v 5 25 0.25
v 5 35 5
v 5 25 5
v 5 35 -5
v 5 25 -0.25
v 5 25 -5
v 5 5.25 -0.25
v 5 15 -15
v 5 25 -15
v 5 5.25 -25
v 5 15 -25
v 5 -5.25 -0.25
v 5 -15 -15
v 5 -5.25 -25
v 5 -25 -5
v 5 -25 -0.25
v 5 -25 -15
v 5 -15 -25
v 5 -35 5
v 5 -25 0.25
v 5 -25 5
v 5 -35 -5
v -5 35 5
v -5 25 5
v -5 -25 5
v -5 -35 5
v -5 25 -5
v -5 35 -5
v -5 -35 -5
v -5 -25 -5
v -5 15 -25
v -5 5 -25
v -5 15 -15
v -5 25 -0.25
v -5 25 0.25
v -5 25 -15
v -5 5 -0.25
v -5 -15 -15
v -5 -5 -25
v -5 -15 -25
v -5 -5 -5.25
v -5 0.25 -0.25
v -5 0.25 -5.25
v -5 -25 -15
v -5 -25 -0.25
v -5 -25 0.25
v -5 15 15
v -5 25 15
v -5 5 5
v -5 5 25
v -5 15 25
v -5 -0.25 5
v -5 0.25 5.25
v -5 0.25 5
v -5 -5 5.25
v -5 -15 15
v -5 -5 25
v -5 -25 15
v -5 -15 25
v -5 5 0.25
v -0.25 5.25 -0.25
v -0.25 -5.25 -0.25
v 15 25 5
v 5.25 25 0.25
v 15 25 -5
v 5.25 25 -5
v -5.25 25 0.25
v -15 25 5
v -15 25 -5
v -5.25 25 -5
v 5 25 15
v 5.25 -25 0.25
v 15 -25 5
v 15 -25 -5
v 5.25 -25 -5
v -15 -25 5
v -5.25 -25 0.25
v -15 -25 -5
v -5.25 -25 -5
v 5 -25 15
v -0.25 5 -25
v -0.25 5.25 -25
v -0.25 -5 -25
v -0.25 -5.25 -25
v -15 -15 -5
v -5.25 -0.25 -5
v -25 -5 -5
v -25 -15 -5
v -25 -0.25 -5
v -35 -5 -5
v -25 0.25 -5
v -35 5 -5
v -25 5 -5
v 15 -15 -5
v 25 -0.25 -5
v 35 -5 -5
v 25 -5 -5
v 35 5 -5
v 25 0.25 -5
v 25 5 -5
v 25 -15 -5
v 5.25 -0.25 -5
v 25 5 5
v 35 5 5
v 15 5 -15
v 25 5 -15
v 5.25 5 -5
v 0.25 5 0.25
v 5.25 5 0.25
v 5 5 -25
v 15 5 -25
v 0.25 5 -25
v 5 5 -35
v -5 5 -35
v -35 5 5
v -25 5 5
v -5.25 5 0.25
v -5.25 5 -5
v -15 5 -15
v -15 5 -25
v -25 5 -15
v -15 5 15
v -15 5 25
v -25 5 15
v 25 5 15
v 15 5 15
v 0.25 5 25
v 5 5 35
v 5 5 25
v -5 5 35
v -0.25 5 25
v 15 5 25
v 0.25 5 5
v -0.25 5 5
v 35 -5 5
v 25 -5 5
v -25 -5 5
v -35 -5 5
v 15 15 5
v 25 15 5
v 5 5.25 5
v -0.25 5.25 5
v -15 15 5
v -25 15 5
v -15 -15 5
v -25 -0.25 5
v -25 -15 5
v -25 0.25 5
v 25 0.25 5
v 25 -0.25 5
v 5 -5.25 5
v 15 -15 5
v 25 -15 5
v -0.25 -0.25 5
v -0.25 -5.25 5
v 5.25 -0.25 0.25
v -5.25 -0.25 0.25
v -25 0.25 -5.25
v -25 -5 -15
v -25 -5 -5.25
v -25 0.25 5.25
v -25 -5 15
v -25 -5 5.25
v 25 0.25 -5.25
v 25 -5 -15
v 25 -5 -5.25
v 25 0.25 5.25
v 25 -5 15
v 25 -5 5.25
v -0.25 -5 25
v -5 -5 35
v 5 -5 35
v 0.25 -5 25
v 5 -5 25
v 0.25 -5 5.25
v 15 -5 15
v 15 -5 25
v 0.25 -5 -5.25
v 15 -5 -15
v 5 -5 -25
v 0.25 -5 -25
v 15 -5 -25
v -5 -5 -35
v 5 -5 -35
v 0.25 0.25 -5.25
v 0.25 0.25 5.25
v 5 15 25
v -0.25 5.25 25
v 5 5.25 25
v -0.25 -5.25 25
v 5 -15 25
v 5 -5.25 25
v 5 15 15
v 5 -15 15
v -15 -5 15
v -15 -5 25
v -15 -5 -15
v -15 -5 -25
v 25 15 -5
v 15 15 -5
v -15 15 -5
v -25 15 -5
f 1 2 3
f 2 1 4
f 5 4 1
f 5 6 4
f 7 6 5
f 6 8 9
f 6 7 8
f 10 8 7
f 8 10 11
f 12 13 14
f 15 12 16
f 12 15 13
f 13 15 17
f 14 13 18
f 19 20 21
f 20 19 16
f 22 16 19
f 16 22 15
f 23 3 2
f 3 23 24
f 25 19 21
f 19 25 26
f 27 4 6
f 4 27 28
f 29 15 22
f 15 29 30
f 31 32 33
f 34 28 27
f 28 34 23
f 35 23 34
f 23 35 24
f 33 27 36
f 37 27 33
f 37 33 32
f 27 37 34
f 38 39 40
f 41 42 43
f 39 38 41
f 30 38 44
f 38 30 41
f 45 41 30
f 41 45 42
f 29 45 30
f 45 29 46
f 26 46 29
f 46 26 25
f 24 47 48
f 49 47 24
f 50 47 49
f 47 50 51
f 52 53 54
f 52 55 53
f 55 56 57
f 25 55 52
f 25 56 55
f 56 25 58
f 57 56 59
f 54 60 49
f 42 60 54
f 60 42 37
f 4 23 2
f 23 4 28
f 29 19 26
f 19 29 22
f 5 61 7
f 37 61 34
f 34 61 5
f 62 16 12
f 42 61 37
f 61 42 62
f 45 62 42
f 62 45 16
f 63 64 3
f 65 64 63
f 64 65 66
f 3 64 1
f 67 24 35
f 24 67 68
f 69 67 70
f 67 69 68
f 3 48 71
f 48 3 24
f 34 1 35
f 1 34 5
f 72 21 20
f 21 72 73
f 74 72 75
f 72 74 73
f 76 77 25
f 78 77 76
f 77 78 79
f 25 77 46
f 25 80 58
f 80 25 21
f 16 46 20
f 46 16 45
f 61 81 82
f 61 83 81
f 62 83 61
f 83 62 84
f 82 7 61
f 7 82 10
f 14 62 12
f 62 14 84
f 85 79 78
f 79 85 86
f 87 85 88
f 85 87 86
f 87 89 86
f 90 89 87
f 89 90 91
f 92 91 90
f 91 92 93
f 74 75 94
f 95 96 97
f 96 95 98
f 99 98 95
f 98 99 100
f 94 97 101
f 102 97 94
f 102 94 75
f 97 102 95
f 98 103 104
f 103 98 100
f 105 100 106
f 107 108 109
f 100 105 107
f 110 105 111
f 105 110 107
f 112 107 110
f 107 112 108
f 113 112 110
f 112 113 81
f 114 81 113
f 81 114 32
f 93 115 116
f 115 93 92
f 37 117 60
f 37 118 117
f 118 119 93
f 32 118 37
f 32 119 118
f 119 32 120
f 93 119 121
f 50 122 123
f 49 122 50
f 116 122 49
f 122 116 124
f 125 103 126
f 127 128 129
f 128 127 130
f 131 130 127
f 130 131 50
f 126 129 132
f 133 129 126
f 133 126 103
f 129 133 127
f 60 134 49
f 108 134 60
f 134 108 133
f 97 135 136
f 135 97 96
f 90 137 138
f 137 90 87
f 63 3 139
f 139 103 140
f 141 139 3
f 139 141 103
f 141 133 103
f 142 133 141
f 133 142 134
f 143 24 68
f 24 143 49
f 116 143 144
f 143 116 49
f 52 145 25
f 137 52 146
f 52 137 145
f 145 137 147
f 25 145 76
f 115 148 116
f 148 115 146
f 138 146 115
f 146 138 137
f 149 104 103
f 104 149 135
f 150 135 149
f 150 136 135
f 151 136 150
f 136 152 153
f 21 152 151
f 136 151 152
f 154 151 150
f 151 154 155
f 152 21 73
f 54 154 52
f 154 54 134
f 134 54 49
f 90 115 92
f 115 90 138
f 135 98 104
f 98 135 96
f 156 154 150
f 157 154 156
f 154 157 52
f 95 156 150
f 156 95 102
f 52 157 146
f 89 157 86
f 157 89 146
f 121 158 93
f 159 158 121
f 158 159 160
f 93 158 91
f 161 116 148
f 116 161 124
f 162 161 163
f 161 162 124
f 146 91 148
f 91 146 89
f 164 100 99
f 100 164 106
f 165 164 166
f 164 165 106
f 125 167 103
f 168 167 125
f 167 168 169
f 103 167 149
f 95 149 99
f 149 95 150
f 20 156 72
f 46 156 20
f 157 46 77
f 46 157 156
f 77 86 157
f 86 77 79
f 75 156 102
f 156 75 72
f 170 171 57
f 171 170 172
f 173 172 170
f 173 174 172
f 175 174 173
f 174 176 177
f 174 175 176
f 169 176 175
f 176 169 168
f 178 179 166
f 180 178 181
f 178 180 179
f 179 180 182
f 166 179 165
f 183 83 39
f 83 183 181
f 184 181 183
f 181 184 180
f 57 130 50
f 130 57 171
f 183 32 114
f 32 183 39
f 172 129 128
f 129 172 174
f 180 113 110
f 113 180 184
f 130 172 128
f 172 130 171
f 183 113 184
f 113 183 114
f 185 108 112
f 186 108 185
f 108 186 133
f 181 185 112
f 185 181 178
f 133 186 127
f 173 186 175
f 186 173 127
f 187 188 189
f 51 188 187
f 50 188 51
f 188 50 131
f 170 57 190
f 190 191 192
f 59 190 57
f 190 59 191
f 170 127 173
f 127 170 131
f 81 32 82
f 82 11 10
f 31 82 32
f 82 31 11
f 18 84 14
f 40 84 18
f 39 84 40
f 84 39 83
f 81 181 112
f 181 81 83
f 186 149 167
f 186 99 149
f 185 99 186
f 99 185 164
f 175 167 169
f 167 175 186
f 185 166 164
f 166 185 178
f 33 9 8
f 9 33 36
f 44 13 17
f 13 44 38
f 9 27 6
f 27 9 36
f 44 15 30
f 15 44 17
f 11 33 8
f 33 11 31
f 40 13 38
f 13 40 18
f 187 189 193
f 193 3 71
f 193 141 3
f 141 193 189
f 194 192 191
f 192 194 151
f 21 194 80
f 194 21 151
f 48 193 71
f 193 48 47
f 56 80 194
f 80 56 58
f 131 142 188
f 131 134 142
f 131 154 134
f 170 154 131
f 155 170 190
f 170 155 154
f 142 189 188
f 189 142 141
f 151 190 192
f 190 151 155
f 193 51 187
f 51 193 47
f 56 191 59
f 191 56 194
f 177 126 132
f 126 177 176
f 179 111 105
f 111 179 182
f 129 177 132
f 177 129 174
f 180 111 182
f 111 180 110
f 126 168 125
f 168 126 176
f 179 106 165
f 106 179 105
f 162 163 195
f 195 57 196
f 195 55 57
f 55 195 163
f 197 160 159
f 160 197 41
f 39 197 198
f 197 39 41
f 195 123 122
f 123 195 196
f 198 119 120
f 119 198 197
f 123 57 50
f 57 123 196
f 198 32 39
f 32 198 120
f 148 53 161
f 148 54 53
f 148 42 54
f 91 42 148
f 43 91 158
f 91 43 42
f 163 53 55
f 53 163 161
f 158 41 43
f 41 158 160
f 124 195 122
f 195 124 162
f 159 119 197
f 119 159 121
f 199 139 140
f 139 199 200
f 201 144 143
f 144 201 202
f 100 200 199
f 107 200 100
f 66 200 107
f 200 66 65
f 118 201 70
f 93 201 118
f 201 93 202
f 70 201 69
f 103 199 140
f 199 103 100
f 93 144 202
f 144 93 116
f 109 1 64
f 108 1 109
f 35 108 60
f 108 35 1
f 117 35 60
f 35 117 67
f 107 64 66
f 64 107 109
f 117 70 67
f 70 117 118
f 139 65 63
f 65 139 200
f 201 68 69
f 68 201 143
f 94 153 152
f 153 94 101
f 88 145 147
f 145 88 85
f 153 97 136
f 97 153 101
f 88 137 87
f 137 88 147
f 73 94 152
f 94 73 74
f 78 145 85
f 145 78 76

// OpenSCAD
s = 10;
g = 0.5;

module C(l) {
    difference() {
        cube([s,s*l,s],center=true);
        
        translate([0,0,s/2])
        cube([s+g,s+g,s+g],center=true);
    }
}

module center() {
    difference() {
        cube([s,s*7,s], center=true);
        
        translate([0,0,s/2-g/2])
        cube([s+g,s*5,s], center=true);
        
        translate([s/2,0,0])
        cube(s+g, center=true);
    }
}

module side() {
    translate([s,0,0])
    C(5);
    translate([s*2,0,0])
    C(3);

    translate([-s,0,0])
    C(5);
    translate([-s*2,0,0])
    C(3);
}

module full(){
    center();
    rotate([0,90,90])
    center();
    rotate([90,0,-90])
    center();
    rotate([0,90,0])
    side();
    rotate([90,0,0])
    side();
    rotate([180,0,90])
    side();
}

module key(l) {
    difference() {
        C(3);
        
        translate([s/2,0,0])
        cube(s+g,center=true);
    }
}

full();

//key(); // print * 1
//C(3); // print * 5
//C(5); // print * 6
//center(); // print * 3
